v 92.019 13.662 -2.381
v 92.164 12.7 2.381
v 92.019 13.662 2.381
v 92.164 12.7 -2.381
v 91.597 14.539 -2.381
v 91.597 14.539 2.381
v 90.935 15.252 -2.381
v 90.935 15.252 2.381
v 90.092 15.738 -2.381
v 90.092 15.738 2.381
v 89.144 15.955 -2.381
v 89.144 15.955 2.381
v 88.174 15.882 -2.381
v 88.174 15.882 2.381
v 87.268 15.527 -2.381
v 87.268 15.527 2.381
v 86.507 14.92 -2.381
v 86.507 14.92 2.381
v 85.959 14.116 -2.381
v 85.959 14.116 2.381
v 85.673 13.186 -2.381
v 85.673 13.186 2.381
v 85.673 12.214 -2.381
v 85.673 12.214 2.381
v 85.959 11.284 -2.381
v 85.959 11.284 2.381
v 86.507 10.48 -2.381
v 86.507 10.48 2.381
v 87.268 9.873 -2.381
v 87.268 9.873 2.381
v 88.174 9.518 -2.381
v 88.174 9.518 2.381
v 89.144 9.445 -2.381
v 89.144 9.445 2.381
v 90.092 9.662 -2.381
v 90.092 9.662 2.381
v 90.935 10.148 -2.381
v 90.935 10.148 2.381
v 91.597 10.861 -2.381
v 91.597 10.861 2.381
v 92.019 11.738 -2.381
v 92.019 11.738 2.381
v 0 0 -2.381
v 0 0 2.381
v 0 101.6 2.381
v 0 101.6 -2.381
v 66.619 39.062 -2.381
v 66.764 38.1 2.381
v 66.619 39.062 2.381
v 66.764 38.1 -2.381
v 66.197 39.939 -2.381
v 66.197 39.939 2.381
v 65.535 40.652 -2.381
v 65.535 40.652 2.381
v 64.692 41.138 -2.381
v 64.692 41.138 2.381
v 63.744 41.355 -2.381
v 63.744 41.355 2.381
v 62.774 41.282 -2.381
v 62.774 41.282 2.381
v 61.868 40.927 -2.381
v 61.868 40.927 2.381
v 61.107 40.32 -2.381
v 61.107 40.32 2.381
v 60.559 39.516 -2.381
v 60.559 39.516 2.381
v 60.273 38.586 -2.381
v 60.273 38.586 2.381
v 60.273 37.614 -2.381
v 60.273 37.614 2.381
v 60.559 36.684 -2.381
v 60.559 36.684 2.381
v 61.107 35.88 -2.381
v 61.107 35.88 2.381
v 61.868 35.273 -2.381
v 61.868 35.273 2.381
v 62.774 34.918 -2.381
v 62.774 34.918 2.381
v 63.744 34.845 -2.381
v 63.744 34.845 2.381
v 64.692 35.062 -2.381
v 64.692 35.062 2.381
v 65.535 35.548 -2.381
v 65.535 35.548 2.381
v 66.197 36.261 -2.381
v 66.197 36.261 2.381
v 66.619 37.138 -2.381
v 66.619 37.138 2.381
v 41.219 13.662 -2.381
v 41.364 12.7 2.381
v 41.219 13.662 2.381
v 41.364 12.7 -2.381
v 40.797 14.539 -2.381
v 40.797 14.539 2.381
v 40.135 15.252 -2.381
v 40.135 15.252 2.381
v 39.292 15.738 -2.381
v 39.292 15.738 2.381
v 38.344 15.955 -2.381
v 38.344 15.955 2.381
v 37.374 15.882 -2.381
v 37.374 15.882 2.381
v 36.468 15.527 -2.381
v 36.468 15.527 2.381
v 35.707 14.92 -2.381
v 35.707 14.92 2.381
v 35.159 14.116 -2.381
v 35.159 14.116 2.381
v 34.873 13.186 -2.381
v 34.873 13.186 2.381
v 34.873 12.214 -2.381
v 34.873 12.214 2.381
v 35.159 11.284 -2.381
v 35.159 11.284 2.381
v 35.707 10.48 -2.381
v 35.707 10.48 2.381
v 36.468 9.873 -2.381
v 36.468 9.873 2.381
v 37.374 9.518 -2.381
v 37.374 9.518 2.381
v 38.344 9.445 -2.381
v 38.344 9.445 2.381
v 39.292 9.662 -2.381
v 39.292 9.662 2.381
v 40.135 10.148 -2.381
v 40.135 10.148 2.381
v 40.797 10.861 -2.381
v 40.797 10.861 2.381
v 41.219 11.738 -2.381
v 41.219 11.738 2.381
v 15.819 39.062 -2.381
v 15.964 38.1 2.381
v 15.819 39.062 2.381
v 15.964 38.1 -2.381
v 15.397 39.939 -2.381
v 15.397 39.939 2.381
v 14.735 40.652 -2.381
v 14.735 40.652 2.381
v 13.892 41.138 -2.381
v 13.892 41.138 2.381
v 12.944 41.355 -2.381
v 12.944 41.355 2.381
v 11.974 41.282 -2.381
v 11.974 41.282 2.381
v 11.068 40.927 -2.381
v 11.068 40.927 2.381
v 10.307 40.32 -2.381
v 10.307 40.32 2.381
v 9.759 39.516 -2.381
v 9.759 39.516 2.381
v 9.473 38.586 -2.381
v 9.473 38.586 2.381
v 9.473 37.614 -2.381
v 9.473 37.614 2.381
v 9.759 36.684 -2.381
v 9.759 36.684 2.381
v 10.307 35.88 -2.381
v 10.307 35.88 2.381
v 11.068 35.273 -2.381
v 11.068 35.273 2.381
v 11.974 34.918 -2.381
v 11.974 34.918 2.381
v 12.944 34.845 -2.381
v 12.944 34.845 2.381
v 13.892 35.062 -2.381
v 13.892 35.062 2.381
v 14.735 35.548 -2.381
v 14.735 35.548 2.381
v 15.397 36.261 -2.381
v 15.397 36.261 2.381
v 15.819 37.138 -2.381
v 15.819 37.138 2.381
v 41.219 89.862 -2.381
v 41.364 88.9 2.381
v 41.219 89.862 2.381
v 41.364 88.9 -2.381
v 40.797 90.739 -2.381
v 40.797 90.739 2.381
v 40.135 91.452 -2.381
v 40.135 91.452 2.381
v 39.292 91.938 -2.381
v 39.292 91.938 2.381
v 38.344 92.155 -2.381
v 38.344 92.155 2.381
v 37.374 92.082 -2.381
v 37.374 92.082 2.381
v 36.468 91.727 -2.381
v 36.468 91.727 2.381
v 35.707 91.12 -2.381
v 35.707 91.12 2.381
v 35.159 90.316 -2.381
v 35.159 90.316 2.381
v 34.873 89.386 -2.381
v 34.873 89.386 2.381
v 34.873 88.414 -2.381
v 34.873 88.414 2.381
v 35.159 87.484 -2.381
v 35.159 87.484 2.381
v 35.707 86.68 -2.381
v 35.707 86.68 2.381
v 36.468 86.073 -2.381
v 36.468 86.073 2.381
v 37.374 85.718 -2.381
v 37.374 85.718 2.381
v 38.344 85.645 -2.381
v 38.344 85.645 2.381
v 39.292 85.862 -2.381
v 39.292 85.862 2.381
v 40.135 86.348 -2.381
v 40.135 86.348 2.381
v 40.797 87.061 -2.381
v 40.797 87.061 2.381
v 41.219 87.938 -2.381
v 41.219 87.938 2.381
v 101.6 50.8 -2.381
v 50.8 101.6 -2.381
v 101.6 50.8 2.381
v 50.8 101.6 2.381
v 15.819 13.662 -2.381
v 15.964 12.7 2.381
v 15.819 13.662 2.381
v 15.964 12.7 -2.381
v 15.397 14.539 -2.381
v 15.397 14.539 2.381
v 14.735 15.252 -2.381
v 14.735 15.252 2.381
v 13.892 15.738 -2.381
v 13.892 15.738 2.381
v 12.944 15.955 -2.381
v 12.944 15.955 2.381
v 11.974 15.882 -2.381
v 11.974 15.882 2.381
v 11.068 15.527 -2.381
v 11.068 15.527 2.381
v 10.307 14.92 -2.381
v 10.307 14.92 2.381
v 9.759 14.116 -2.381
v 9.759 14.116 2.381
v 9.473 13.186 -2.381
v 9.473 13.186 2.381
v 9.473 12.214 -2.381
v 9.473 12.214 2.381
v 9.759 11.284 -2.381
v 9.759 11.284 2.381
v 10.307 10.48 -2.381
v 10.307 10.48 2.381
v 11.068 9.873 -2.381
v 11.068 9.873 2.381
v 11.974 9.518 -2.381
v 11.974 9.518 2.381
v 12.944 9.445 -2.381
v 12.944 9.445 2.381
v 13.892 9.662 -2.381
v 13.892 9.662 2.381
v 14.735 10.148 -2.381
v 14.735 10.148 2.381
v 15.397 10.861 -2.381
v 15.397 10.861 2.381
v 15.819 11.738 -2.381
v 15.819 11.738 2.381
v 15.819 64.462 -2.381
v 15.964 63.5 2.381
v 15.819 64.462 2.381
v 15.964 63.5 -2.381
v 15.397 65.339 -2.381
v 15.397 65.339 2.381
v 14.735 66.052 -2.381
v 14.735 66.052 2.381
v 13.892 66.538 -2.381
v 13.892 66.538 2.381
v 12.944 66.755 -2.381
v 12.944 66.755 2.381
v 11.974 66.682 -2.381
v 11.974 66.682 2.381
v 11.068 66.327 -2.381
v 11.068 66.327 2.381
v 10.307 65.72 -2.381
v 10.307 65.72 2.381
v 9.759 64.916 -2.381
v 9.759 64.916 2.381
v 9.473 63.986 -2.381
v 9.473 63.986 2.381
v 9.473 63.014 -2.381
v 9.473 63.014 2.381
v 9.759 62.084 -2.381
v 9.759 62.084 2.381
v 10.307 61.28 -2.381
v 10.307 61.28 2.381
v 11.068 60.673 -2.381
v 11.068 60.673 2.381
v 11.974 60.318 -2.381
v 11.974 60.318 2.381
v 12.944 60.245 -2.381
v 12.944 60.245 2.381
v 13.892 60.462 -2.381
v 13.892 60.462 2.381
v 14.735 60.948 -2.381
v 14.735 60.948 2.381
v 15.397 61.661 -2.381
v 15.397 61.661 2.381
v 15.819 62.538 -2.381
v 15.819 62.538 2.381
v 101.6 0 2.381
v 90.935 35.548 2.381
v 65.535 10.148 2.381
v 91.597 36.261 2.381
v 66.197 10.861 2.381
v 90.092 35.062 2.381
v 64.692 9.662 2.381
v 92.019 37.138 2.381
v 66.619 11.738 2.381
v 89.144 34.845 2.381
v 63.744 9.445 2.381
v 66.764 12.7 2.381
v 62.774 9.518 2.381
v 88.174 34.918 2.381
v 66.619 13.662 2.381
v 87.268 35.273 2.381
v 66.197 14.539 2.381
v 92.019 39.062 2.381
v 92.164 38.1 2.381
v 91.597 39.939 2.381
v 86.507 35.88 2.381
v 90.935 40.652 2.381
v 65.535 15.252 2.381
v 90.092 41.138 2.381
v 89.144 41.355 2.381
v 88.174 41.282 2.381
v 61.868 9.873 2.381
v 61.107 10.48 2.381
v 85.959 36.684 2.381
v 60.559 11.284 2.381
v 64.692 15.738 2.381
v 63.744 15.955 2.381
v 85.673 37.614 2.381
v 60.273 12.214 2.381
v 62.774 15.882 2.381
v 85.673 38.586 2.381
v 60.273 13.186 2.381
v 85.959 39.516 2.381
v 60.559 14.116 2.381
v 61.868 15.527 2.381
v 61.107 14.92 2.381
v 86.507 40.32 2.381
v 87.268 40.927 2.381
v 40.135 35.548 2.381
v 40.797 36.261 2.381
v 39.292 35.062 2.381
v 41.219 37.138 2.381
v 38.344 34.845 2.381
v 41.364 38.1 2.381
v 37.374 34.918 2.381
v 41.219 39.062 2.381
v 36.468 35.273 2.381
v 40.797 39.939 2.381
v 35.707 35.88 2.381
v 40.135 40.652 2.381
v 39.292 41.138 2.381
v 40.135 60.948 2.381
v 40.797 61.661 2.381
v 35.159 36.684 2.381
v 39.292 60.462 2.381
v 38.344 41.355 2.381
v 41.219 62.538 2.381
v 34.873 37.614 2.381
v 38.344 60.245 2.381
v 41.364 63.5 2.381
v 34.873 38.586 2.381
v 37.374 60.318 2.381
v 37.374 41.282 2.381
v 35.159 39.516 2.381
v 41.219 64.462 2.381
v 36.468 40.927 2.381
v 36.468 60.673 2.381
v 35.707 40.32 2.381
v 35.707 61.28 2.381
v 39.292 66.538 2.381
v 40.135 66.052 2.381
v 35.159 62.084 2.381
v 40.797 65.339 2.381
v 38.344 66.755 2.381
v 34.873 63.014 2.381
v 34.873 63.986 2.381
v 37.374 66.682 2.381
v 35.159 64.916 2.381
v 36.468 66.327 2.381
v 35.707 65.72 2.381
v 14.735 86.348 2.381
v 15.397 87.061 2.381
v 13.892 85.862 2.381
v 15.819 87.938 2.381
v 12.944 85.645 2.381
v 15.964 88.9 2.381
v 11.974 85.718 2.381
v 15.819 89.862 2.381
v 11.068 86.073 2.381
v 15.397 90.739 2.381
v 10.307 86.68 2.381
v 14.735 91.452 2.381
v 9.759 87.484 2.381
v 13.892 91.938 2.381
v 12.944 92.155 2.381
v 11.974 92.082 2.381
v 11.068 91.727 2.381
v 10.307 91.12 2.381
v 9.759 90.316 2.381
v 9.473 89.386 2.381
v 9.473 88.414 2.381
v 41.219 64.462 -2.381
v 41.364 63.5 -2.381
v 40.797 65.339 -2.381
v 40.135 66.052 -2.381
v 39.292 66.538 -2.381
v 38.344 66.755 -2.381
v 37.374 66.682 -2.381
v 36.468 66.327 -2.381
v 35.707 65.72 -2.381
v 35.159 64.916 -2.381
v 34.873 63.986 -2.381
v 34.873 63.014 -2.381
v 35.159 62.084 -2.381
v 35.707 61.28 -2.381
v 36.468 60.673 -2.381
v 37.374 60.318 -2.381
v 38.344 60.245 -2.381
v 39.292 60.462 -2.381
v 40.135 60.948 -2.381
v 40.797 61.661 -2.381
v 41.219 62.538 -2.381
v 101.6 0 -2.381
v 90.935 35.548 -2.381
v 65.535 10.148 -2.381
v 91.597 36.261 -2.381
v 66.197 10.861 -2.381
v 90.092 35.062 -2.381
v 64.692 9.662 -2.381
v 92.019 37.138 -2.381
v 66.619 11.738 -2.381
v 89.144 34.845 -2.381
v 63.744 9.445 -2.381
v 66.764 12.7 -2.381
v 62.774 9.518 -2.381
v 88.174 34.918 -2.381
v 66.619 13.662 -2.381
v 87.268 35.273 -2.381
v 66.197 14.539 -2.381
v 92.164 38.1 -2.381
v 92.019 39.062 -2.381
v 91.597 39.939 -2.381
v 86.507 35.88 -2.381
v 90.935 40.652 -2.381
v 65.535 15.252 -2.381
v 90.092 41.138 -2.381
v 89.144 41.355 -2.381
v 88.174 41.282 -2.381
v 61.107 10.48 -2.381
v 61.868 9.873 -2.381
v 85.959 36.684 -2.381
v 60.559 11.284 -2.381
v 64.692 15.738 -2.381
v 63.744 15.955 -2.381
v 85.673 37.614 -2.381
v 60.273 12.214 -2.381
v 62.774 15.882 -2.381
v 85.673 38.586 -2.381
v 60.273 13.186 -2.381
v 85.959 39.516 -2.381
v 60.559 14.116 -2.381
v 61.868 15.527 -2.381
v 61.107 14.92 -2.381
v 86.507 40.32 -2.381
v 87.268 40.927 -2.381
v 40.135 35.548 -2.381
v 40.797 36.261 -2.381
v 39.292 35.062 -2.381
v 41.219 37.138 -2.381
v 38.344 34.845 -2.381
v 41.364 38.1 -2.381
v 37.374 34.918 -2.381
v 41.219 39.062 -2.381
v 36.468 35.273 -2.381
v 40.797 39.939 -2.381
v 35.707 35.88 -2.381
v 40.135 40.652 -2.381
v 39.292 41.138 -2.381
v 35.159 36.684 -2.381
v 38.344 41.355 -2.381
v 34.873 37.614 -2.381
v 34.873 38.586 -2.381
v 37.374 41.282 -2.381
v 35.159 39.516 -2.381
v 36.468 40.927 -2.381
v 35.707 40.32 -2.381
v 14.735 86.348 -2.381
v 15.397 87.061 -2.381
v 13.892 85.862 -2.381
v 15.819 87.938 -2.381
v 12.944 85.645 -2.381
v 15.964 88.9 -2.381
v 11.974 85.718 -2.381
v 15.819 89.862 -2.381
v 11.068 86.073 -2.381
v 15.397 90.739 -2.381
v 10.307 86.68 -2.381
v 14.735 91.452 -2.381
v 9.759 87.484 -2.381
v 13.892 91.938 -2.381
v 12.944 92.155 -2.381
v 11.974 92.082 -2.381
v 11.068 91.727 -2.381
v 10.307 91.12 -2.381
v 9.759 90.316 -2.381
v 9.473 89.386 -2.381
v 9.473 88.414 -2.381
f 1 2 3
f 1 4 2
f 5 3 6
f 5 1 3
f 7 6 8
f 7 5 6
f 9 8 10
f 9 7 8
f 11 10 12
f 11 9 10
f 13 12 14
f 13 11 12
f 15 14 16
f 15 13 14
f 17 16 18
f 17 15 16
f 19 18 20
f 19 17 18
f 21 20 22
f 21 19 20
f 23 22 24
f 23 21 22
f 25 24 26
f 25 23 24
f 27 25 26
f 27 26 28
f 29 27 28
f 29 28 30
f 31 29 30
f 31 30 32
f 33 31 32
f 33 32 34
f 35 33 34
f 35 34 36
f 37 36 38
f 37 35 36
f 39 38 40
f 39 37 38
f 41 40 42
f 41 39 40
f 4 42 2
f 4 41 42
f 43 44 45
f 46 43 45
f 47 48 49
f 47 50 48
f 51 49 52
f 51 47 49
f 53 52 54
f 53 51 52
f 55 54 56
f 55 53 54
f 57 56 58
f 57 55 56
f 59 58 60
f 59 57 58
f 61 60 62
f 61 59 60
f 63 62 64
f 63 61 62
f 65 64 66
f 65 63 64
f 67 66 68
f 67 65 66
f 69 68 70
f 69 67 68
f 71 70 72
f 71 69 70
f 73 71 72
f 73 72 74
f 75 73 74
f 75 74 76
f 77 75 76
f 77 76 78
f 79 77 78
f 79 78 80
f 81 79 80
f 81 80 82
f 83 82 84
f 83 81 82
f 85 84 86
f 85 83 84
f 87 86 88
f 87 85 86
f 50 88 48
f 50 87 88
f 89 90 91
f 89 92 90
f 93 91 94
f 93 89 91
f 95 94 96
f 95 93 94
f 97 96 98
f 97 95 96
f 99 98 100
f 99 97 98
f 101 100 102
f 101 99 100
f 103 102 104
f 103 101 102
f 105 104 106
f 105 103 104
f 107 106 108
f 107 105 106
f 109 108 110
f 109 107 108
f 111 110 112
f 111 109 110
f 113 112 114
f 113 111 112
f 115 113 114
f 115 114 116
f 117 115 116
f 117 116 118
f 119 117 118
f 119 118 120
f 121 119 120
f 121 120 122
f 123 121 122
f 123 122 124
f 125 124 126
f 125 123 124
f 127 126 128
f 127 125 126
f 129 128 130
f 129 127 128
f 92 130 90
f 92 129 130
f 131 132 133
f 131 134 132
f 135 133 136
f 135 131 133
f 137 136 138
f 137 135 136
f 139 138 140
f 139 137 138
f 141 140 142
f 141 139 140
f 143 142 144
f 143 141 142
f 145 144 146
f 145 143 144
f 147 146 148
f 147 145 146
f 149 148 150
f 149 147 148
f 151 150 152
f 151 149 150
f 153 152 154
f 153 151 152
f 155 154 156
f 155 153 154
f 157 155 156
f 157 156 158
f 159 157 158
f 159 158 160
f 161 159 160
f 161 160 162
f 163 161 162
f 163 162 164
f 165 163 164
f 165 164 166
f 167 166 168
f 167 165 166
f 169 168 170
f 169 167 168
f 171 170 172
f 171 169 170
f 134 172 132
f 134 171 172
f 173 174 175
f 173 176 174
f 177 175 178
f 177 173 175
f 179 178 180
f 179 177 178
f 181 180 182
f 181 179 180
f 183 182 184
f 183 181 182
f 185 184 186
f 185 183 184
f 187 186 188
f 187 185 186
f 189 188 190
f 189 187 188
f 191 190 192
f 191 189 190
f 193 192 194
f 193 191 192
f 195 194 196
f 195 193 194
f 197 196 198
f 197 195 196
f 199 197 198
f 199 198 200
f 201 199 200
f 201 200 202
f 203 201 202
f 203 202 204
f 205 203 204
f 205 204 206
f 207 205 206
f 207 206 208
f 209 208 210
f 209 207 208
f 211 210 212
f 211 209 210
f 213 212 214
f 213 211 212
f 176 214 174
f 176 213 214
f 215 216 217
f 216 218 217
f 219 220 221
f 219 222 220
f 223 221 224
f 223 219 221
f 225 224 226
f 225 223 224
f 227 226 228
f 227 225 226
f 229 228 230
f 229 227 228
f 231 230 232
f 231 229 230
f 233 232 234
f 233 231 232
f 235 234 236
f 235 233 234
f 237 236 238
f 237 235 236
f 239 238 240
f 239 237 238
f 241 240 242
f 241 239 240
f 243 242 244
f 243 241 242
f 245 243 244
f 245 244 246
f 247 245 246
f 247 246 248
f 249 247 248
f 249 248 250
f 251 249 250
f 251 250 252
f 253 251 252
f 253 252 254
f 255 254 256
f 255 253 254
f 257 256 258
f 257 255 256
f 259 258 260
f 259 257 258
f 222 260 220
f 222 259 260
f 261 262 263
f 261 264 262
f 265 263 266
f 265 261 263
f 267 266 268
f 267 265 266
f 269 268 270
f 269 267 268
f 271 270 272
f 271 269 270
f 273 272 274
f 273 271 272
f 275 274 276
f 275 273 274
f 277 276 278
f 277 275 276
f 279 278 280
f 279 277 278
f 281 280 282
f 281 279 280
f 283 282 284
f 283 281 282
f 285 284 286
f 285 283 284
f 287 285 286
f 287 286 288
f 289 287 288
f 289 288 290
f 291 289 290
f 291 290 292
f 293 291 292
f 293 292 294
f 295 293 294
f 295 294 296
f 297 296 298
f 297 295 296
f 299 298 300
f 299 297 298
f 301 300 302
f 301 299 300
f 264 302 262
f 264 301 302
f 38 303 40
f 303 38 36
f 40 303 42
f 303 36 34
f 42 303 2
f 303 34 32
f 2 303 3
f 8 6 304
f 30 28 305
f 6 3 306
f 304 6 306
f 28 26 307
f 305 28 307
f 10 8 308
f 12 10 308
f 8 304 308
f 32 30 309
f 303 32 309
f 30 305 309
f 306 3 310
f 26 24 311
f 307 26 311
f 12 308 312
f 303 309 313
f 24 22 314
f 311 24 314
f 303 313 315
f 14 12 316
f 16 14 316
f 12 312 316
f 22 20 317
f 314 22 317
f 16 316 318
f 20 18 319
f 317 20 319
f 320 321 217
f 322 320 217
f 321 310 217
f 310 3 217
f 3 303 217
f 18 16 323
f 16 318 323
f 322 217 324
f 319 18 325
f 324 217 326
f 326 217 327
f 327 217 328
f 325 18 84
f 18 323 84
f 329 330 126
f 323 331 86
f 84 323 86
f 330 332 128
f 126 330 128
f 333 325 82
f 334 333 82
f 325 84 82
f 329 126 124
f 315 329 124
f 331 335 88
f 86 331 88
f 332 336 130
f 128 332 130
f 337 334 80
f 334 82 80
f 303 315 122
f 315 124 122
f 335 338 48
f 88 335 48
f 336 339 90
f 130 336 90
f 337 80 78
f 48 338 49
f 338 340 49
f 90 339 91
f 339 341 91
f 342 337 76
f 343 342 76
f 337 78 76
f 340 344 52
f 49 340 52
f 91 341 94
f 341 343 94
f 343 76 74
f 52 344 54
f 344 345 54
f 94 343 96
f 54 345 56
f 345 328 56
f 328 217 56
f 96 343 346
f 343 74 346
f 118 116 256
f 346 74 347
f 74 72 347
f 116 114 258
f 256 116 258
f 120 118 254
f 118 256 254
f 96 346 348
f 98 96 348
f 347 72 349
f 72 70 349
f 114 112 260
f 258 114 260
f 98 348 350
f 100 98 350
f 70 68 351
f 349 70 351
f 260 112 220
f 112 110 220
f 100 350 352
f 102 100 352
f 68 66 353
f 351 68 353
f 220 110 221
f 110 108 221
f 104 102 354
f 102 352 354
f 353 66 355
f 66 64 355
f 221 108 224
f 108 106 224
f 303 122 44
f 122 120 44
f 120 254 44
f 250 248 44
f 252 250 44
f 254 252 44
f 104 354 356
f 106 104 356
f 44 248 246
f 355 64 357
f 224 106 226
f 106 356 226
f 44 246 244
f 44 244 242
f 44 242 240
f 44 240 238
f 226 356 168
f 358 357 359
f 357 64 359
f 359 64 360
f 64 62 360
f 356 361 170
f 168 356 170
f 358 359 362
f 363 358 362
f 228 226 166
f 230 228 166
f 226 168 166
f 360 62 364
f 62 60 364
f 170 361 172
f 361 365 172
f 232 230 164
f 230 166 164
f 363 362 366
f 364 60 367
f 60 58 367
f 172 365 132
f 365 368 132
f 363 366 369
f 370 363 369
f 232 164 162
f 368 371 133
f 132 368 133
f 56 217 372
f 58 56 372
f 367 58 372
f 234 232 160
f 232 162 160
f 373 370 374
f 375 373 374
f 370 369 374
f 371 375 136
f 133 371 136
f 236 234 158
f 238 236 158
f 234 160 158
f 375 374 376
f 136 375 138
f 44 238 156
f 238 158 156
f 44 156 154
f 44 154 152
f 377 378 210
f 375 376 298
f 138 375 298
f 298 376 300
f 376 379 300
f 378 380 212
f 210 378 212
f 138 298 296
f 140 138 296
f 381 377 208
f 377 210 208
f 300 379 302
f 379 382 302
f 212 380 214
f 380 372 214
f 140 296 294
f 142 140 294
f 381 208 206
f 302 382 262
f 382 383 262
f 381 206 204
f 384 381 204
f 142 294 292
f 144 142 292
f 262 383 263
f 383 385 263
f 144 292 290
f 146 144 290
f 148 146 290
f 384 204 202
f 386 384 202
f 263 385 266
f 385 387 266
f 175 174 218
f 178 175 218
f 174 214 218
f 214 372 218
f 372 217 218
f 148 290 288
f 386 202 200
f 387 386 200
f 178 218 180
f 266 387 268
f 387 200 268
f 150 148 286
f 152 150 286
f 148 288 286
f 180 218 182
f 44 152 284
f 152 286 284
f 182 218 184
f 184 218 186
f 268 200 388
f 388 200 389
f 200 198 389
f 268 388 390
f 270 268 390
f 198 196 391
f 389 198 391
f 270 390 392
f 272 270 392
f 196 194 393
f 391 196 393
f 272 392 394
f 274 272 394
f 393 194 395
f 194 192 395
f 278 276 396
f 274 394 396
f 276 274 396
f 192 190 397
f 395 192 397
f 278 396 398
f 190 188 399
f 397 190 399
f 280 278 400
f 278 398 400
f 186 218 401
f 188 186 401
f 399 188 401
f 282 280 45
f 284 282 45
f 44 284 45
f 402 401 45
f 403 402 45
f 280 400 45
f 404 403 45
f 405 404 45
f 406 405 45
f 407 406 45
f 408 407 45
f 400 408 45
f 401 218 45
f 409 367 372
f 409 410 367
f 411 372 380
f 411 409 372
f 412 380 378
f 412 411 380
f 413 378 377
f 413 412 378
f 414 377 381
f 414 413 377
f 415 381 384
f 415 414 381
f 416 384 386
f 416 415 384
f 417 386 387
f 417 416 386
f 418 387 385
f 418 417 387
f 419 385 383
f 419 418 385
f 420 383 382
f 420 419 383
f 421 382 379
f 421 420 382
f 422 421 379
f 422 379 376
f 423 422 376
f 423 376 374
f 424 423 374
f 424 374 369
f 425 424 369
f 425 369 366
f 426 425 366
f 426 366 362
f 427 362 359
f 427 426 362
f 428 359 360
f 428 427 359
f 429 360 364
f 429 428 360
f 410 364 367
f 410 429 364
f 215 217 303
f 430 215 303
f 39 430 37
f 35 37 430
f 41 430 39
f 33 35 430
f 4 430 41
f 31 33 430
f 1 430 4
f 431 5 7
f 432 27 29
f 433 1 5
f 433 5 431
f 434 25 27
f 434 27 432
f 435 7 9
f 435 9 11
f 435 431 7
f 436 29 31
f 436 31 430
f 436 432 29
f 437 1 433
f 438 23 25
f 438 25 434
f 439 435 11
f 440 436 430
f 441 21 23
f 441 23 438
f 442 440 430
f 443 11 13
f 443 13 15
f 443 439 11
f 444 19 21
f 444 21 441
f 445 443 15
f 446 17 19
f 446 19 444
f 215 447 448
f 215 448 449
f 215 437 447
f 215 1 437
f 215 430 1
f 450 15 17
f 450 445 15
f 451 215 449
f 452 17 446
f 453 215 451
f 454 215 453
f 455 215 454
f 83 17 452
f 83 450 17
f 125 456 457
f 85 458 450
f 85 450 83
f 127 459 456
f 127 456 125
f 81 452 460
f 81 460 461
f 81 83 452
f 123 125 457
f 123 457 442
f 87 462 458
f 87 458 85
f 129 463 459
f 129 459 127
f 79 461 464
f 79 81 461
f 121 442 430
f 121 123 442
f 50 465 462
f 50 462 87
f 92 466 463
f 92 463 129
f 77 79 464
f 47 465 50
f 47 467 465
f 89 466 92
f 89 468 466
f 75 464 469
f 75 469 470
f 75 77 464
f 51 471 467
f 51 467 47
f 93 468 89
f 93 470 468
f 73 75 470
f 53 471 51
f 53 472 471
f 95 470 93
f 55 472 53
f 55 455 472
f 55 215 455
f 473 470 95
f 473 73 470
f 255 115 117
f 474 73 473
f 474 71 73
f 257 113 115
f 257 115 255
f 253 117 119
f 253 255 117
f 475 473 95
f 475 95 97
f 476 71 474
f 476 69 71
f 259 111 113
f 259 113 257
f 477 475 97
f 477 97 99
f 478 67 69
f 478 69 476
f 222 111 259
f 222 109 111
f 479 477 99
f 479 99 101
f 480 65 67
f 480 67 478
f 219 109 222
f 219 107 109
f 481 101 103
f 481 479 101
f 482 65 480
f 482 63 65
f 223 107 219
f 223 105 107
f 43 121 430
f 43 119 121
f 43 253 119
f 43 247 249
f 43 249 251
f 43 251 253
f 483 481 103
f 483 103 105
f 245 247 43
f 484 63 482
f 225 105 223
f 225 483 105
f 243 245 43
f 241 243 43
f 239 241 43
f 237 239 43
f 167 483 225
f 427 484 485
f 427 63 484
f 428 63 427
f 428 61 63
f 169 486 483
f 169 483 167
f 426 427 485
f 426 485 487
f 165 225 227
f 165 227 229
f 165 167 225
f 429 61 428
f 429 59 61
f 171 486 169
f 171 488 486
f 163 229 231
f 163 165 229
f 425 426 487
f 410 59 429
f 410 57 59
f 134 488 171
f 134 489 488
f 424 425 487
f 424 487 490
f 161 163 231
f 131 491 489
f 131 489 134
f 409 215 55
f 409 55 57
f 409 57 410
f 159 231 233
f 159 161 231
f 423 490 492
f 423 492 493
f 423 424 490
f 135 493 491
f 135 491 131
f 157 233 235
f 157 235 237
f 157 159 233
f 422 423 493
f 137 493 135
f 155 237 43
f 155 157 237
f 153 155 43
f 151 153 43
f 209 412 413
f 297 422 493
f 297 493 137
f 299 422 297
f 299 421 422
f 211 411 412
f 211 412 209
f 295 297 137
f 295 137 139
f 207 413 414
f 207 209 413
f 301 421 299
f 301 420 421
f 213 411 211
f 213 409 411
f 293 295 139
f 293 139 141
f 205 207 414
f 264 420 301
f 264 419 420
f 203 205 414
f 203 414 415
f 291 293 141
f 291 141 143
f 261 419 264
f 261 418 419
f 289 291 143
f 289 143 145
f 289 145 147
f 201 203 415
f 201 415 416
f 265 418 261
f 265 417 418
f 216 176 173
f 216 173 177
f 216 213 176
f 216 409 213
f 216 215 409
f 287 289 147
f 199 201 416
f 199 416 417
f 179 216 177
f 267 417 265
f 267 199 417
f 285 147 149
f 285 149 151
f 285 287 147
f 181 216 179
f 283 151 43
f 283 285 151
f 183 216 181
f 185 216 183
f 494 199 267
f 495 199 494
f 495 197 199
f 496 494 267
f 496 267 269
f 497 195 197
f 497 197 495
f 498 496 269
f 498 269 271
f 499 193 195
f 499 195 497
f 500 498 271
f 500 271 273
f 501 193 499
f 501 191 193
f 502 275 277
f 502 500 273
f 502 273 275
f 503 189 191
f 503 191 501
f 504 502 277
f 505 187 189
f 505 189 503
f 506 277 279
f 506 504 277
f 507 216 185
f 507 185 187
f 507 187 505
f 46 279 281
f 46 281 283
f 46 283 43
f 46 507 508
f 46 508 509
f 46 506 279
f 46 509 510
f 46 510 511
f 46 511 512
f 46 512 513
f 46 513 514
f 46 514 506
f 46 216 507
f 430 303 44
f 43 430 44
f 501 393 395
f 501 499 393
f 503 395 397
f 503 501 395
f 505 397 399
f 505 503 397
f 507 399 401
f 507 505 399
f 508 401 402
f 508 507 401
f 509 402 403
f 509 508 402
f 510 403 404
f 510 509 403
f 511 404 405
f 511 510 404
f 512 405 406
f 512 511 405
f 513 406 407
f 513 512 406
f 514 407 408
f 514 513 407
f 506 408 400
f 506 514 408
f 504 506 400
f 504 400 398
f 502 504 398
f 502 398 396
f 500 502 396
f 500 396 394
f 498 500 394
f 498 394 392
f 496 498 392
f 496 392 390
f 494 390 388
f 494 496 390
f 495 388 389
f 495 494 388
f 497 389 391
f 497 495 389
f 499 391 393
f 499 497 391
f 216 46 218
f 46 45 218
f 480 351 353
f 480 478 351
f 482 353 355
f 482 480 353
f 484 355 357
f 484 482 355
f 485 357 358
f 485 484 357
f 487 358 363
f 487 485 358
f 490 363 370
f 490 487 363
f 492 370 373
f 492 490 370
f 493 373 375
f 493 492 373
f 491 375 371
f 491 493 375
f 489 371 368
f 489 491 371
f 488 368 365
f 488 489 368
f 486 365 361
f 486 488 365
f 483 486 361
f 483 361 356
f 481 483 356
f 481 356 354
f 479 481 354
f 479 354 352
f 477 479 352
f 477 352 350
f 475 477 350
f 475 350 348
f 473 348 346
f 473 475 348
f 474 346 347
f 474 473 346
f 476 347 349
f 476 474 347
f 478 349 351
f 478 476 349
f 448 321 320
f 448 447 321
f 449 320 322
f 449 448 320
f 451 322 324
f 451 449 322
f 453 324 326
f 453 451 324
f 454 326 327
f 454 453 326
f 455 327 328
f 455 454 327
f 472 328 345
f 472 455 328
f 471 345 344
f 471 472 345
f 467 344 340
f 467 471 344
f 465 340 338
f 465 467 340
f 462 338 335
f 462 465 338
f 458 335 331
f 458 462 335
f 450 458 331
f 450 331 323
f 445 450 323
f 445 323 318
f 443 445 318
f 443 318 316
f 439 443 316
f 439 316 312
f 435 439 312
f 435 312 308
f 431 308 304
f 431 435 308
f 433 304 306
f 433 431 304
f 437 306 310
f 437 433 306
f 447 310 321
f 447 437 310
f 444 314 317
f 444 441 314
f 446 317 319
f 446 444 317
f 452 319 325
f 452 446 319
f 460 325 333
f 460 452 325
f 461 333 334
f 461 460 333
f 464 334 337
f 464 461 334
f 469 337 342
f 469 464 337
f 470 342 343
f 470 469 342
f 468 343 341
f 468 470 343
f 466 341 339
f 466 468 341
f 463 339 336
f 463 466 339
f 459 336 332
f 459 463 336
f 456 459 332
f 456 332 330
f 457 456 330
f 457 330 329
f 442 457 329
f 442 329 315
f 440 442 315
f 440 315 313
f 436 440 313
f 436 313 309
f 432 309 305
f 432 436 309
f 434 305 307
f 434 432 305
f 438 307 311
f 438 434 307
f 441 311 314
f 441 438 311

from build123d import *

# Parameters (mm, degrees)
SKETCH1_R           = 3.2639
BOSS_EXTRUDE1_DEPTH = 2.38125


with BuildPart() as part:
    # Sketch1 → Boss-Extrude1 (new body, symmetric)
    with BuildSketch(Plane.XY):
        Polygon((0, 0), (0, 101.6), (50.8, 101.6), (101.6, 50.8), (101.6, 0), align=None)
        with Locations((12.7, 12.7)):
            Circle(SKETCH1_R, mode=Mode.SUBTRACT)
        with Locations((38.1, 12.7)):
            Circle(SKETCH1_R, mode=Mode.SUBTRACT)
        with Locations((63.5, 12.7)):
            Circle(SKETCH1_R, mode=Mode.SUBTRACT)
        with Locations((12.7, 38.1)):
            Circle(SKETCH1_R, mode=Mode.SUBTRACT)
        with Locations((12.7, 63.5)):
            Circle(SKETCH1_R, mode=Mode.SUBTRACT)
        with Locations((88.9, 12.7)):
            Circle(SKETCH1_R, mode=Mode.SUBTRACT)
        with Locations((88.9, 38.1)):
            Circle(SKETCH1_R, mode=Mode.SUBTRACT)
        with Locations((63.5, 38.1)):
            Circle(SKETCH1_R, mode=Mode.SUBTRACT)
        with Locations((38.1, 38.1)):
            Circle(SKETCH1_R, mode=Mode.SUBTRACT)
        with Locations((12.7, 88.9)):
            Circle(SKETCH1_R, mode=Mode.SUBTRACT)
        with Locations((38.1, 88.9)):
            Circle(SKETCH1_R, mode=Mode.SUBTRACT)
        with Locations((38.1, 63.5)):
            Circle(SKETCH1_R, mode=Mode.SUBTRACT)
    extrude(amount=BOSS_EXTRUDE1_DEPTH, both=True)


solid = part.part
